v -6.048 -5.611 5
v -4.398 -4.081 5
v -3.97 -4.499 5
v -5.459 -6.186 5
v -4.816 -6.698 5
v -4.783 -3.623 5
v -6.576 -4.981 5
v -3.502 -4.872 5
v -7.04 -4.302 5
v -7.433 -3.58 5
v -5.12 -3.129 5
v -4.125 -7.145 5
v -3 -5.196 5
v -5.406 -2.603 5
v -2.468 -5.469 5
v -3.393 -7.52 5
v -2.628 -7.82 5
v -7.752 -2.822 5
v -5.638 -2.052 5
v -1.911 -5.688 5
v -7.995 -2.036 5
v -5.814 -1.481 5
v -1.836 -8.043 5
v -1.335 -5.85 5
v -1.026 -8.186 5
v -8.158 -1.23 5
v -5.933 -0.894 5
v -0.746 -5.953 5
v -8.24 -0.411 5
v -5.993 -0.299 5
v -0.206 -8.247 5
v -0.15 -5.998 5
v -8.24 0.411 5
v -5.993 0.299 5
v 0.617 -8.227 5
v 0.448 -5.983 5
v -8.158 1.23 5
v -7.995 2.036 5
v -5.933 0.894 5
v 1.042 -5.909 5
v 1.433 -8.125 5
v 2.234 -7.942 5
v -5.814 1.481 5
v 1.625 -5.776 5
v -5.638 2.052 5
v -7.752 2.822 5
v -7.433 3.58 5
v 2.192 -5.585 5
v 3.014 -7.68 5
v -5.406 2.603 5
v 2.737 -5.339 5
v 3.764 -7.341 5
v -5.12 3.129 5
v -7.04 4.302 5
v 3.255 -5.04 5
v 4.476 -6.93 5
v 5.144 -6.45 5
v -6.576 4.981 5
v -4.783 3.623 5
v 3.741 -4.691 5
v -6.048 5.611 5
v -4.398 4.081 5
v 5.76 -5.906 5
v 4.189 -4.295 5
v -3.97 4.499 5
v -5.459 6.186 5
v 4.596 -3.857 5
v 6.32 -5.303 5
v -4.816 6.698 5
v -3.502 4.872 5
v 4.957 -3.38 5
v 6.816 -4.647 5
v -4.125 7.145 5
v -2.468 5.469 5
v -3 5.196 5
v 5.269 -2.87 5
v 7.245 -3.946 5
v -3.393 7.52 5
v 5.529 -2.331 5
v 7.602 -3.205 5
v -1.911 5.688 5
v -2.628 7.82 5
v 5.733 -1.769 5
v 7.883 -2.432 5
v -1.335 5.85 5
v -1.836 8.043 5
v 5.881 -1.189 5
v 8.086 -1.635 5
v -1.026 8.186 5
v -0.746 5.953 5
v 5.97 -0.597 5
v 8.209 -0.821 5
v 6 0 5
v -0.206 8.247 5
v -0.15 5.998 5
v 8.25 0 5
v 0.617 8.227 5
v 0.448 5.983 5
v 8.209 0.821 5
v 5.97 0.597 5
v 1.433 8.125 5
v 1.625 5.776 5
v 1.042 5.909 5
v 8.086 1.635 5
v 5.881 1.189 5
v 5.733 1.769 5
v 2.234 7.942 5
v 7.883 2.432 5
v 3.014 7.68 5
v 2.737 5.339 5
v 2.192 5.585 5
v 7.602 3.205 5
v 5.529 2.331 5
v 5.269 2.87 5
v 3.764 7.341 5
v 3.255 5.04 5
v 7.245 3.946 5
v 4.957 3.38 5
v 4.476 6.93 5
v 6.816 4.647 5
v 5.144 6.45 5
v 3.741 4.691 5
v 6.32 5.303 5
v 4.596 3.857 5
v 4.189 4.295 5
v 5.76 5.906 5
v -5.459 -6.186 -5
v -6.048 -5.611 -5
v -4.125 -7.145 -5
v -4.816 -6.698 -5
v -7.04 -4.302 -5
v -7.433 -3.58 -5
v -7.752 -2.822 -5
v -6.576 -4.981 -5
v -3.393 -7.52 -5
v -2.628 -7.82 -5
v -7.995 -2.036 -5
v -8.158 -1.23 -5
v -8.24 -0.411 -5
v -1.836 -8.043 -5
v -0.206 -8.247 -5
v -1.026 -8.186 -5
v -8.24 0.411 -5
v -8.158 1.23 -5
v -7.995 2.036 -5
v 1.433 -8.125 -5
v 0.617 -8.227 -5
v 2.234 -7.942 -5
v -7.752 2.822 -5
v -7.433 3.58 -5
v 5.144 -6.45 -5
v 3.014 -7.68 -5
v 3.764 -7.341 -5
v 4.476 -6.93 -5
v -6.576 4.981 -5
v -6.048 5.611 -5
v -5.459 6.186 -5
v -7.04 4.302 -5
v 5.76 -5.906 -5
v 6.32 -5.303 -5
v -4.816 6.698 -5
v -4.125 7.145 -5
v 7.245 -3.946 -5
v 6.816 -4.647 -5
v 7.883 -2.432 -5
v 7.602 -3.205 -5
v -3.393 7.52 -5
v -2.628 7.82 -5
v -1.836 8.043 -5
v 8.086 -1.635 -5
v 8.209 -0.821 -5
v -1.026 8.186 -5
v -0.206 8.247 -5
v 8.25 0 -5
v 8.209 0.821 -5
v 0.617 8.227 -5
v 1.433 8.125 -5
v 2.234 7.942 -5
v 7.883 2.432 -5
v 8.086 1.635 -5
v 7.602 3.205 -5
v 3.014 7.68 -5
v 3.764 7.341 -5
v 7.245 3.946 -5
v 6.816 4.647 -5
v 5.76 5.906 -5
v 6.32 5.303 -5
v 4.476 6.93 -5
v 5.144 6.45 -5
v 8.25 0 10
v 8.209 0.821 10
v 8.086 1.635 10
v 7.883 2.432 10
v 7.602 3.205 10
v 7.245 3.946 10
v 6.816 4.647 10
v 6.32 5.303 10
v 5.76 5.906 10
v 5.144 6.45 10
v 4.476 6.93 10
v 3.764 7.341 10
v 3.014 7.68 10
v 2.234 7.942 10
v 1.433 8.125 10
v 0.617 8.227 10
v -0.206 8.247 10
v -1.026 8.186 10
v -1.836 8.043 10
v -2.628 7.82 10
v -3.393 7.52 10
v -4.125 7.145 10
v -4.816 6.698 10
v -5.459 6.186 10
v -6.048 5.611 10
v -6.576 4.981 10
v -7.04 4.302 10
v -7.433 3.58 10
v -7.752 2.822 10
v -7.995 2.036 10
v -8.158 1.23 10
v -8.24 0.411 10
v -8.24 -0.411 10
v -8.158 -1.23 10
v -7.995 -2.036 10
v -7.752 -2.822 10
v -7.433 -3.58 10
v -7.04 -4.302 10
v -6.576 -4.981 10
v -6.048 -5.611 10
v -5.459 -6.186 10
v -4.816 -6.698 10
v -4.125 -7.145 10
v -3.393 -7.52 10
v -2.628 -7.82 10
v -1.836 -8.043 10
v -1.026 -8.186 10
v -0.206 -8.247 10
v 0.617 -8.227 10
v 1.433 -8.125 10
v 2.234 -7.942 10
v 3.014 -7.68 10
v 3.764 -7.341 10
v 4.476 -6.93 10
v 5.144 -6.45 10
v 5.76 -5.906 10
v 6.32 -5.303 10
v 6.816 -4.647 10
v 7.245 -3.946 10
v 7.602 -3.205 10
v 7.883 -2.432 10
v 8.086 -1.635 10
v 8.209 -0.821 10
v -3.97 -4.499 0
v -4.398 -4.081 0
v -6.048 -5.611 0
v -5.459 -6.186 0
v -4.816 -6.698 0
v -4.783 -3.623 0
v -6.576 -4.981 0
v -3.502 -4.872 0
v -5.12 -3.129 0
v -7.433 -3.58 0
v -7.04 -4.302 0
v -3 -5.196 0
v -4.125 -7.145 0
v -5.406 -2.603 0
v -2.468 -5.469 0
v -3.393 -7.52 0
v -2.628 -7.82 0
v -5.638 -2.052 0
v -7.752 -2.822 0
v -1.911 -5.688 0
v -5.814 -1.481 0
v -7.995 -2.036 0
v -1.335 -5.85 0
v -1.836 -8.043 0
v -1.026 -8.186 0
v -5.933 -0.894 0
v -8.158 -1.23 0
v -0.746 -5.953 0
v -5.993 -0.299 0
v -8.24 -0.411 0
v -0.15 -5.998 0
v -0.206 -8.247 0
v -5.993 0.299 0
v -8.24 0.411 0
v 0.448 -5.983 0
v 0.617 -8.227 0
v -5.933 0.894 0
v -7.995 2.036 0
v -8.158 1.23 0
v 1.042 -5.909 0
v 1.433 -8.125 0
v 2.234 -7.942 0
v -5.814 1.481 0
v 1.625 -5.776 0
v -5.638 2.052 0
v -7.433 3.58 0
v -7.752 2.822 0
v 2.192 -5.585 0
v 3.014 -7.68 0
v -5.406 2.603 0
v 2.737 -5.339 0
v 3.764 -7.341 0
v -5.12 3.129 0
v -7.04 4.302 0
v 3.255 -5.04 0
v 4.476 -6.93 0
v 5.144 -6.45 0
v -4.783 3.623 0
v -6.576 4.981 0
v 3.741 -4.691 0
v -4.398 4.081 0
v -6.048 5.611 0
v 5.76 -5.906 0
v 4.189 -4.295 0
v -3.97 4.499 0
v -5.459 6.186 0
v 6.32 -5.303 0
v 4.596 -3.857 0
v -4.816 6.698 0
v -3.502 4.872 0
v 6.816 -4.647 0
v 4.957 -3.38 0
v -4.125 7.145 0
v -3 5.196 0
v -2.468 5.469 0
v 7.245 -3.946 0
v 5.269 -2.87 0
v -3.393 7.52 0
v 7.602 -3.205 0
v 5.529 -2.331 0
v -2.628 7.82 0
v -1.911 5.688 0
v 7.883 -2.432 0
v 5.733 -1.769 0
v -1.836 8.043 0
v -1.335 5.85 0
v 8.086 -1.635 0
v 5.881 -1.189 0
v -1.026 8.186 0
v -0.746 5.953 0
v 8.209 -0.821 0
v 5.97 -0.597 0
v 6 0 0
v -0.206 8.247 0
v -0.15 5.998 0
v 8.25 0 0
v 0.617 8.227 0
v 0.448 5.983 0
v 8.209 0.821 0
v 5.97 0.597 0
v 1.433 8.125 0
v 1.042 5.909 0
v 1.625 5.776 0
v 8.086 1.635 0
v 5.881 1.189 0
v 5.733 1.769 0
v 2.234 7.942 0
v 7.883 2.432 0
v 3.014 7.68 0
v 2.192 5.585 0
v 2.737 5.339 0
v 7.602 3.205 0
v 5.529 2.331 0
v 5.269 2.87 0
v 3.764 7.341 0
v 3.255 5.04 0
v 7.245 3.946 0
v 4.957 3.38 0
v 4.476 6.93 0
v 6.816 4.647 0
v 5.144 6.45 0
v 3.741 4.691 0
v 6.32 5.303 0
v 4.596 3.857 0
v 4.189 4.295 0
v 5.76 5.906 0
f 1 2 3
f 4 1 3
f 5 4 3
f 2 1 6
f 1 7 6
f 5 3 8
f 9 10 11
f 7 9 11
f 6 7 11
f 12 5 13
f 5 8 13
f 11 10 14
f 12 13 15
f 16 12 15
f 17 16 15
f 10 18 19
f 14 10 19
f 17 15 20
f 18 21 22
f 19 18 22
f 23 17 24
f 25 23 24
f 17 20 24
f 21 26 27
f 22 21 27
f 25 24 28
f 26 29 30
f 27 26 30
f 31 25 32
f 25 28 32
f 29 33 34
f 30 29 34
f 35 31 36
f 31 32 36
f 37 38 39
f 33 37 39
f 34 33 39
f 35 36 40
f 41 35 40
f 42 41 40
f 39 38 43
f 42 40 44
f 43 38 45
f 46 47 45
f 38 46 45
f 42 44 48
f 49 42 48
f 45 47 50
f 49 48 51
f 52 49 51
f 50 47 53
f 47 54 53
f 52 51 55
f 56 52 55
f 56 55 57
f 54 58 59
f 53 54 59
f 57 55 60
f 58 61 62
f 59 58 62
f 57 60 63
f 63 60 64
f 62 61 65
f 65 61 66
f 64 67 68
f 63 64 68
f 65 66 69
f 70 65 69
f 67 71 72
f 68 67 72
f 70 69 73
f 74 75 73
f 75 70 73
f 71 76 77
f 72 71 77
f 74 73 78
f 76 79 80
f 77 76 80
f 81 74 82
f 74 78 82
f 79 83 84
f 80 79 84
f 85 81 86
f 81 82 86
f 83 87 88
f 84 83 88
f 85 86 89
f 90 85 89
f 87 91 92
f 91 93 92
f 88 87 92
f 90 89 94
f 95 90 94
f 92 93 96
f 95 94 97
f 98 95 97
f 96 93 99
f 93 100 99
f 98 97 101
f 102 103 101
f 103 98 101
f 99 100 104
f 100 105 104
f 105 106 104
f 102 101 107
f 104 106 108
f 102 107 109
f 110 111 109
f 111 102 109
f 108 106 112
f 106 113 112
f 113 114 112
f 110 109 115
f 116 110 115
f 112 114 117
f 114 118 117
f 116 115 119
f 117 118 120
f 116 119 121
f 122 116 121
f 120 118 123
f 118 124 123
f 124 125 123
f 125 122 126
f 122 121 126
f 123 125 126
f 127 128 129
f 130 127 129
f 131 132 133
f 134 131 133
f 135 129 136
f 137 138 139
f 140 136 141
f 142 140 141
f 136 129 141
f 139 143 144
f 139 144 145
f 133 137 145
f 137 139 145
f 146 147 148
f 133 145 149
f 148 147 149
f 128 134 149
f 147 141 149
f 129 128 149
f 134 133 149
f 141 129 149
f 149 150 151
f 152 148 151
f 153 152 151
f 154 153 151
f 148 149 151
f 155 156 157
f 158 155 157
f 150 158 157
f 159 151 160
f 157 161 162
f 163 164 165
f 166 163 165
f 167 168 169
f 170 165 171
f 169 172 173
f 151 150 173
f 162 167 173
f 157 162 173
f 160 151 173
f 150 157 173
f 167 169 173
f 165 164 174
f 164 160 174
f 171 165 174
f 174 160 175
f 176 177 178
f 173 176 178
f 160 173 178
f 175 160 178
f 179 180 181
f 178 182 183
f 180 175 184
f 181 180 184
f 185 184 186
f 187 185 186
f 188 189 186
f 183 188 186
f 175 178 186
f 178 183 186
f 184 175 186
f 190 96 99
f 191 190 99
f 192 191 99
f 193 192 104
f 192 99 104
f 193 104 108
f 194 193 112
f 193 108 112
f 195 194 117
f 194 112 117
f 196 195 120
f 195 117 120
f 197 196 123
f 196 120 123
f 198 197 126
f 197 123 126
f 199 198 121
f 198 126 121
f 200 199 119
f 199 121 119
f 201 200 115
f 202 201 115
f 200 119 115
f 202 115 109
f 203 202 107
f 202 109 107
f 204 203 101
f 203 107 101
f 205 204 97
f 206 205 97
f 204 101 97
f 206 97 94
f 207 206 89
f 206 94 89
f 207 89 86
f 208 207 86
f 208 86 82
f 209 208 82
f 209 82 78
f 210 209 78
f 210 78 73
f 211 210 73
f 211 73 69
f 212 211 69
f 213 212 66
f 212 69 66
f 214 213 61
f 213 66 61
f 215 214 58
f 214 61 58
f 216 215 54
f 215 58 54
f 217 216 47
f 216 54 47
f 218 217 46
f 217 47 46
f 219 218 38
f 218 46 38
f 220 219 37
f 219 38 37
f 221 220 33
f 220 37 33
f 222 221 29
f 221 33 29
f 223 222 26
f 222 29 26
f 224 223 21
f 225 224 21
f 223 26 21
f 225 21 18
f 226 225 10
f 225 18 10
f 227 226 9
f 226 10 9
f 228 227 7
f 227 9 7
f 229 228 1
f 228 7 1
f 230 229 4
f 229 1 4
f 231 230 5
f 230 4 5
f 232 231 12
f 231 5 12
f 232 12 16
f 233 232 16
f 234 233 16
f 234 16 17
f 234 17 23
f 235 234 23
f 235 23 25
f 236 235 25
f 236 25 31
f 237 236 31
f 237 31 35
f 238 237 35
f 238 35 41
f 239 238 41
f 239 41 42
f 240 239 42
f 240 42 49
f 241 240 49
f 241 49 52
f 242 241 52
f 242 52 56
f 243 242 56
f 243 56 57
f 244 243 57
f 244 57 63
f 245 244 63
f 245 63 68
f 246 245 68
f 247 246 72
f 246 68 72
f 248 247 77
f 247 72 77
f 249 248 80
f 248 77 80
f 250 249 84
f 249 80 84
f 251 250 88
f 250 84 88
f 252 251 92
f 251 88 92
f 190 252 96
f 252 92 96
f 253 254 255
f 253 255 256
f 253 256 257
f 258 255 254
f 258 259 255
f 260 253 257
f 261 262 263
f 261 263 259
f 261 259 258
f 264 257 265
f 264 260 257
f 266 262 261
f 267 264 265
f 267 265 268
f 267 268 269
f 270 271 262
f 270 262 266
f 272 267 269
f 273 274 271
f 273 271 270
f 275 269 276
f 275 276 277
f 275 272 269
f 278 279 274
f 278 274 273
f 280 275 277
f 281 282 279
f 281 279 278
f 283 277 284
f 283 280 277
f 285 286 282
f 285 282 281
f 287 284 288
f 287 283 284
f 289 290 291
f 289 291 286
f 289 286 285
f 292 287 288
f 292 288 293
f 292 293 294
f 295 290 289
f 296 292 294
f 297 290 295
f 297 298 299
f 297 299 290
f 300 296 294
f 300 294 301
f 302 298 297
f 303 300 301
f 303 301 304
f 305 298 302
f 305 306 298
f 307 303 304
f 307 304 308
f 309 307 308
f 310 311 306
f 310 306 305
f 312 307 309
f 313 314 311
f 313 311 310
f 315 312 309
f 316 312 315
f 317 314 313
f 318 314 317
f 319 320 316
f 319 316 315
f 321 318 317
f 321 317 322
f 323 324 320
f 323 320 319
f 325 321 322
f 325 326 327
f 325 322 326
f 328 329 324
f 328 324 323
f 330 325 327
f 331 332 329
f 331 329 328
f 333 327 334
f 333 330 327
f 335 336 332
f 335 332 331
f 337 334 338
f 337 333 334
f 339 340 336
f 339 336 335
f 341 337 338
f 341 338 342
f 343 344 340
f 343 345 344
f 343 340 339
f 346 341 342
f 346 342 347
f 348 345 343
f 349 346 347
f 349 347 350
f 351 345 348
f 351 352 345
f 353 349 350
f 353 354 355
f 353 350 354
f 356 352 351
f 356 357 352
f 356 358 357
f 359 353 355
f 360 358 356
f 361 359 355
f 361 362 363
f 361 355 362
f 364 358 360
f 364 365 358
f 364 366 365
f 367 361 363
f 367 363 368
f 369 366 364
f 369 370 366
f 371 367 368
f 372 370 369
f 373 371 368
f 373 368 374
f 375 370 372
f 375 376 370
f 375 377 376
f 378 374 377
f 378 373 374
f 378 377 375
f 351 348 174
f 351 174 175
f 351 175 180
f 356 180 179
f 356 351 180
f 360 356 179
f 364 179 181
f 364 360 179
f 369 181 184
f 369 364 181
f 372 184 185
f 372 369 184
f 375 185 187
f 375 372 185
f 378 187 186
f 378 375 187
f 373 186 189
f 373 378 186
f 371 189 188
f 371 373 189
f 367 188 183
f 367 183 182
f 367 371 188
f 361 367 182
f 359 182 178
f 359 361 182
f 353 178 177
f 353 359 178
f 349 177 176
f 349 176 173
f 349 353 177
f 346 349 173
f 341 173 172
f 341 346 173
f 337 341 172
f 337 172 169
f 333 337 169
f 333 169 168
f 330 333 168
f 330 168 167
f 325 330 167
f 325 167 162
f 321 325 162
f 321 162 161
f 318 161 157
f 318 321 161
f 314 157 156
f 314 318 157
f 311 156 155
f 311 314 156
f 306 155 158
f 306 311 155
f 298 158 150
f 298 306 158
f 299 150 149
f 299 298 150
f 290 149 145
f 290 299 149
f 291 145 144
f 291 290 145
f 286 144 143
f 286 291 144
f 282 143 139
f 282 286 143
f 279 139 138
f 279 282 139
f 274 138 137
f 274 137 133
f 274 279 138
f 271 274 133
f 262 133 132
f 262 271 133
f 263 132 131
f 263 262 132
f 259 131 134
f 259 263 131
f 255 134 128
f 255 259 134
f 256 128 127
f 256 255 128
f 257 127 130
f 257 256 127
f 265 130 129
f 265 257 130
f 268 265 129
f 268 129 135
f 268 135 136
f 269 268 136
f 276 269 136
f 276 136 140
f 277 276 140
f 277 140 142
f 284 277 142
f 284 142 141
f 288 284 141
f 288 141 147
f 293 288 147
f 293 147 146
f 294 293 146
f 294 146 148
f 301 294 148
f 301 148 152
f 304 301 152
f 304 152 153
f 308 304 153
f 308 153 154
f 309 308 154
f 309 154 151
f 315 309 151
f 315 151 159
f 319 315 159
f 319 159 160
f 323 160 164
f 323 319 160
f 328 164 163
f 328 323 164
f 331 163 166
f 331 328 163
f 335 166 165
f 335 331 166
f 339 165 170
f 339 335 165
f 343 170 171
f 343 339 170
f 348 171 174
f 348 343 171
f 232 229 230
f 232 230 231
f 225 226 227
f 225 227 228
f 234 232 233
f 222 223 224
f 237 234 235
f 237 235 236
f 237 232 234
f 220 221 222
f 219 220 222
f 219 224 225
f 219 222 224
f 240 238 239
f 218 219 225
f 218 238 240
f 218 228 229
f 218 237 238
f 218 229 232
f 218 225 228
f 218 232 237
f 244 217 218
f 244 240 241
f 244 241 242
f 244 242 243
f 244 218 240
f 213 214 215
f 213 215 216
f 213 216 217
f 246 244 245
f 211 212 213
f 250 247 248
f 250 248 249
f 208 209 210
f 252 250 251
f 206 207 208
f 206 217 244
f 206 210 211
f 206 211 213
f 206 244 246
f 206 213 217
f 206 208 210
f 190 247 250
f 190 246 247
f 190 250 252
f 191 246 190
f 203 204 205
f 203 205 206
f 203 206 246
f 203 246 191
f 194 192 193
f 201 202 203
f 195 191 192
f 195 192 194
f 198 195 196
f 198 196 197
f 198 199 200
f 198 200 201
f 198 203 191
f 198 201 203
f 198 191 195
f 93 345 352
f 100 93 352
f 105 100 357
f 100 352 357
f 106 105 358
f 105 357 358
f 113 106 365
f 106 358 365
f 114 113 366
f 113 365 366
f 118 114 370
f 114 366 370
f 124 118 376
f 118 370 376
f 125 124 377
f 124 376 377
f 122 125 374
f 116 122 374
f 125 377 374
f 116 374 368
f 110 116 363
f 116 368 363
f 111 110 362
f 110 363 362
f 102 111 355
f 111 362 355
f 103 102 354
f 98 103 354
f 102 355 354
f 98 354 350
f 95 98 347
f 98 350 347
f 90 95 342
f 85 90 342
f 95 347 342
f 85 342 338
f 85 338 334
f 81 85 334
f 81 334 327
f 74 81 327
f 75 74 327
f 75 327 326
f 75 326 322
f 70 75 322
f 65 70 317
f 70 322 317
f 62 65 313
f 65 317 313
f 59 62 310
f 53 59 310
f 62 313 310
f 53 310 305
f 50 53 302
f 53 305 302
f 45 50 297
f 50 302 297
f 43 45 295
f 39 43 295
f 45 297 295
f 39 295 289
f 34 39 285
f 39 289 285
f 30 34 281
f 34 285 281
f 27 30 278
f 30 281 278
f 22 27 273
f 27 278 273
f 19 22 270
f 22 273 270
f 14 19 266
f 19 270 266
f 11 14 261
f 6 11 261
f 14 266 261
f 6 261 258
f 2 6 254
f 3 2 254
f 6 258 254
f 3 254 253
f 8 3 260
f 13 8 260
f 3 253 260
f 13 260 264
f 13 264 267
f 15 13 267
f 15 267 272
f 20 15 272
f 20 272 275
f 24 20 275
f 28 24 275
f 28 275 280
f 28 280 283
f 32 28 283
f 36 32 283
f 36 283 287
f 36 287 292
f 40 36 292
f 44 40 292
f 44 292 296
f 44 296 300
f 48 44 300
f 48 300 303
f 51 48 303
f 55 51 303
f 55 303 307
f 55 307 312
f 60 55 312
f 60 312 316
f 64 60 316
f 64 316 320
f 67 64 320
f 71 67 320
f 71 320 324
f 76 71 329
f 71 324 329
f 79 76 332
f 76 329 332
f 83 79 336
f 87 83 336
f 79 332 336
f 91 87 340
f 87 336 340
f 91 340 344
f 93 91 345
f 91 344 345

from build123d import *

# Parameters (mm, degrees)
F0_R     = 8.25
F1_DEPTH = 5
F2_R     = 6
F3_DEPTH = 5
F4_R     = 8.25
F5_DEPTH = 5


with BuildPart() as f1:
    # F0 (on Top) → F1 (new body)
    with BuildSketch(Plane.XY):
        Circle(F0_R)
    extrude(amount=-F1_DEPTH)

    # F2 (on Top) → F3 (join)
    with BuildSketch(Plane.XY):
        Circle(F2_R)
    extrude(amount=F3_DEPTH)

    # F4 (on face) → F5 (join)
    with BuildSketch(Plane.XY.offset(5)):
        Circle(F4_R)
    extrude(amount=F5_DEPTH)


solid = f1.part
